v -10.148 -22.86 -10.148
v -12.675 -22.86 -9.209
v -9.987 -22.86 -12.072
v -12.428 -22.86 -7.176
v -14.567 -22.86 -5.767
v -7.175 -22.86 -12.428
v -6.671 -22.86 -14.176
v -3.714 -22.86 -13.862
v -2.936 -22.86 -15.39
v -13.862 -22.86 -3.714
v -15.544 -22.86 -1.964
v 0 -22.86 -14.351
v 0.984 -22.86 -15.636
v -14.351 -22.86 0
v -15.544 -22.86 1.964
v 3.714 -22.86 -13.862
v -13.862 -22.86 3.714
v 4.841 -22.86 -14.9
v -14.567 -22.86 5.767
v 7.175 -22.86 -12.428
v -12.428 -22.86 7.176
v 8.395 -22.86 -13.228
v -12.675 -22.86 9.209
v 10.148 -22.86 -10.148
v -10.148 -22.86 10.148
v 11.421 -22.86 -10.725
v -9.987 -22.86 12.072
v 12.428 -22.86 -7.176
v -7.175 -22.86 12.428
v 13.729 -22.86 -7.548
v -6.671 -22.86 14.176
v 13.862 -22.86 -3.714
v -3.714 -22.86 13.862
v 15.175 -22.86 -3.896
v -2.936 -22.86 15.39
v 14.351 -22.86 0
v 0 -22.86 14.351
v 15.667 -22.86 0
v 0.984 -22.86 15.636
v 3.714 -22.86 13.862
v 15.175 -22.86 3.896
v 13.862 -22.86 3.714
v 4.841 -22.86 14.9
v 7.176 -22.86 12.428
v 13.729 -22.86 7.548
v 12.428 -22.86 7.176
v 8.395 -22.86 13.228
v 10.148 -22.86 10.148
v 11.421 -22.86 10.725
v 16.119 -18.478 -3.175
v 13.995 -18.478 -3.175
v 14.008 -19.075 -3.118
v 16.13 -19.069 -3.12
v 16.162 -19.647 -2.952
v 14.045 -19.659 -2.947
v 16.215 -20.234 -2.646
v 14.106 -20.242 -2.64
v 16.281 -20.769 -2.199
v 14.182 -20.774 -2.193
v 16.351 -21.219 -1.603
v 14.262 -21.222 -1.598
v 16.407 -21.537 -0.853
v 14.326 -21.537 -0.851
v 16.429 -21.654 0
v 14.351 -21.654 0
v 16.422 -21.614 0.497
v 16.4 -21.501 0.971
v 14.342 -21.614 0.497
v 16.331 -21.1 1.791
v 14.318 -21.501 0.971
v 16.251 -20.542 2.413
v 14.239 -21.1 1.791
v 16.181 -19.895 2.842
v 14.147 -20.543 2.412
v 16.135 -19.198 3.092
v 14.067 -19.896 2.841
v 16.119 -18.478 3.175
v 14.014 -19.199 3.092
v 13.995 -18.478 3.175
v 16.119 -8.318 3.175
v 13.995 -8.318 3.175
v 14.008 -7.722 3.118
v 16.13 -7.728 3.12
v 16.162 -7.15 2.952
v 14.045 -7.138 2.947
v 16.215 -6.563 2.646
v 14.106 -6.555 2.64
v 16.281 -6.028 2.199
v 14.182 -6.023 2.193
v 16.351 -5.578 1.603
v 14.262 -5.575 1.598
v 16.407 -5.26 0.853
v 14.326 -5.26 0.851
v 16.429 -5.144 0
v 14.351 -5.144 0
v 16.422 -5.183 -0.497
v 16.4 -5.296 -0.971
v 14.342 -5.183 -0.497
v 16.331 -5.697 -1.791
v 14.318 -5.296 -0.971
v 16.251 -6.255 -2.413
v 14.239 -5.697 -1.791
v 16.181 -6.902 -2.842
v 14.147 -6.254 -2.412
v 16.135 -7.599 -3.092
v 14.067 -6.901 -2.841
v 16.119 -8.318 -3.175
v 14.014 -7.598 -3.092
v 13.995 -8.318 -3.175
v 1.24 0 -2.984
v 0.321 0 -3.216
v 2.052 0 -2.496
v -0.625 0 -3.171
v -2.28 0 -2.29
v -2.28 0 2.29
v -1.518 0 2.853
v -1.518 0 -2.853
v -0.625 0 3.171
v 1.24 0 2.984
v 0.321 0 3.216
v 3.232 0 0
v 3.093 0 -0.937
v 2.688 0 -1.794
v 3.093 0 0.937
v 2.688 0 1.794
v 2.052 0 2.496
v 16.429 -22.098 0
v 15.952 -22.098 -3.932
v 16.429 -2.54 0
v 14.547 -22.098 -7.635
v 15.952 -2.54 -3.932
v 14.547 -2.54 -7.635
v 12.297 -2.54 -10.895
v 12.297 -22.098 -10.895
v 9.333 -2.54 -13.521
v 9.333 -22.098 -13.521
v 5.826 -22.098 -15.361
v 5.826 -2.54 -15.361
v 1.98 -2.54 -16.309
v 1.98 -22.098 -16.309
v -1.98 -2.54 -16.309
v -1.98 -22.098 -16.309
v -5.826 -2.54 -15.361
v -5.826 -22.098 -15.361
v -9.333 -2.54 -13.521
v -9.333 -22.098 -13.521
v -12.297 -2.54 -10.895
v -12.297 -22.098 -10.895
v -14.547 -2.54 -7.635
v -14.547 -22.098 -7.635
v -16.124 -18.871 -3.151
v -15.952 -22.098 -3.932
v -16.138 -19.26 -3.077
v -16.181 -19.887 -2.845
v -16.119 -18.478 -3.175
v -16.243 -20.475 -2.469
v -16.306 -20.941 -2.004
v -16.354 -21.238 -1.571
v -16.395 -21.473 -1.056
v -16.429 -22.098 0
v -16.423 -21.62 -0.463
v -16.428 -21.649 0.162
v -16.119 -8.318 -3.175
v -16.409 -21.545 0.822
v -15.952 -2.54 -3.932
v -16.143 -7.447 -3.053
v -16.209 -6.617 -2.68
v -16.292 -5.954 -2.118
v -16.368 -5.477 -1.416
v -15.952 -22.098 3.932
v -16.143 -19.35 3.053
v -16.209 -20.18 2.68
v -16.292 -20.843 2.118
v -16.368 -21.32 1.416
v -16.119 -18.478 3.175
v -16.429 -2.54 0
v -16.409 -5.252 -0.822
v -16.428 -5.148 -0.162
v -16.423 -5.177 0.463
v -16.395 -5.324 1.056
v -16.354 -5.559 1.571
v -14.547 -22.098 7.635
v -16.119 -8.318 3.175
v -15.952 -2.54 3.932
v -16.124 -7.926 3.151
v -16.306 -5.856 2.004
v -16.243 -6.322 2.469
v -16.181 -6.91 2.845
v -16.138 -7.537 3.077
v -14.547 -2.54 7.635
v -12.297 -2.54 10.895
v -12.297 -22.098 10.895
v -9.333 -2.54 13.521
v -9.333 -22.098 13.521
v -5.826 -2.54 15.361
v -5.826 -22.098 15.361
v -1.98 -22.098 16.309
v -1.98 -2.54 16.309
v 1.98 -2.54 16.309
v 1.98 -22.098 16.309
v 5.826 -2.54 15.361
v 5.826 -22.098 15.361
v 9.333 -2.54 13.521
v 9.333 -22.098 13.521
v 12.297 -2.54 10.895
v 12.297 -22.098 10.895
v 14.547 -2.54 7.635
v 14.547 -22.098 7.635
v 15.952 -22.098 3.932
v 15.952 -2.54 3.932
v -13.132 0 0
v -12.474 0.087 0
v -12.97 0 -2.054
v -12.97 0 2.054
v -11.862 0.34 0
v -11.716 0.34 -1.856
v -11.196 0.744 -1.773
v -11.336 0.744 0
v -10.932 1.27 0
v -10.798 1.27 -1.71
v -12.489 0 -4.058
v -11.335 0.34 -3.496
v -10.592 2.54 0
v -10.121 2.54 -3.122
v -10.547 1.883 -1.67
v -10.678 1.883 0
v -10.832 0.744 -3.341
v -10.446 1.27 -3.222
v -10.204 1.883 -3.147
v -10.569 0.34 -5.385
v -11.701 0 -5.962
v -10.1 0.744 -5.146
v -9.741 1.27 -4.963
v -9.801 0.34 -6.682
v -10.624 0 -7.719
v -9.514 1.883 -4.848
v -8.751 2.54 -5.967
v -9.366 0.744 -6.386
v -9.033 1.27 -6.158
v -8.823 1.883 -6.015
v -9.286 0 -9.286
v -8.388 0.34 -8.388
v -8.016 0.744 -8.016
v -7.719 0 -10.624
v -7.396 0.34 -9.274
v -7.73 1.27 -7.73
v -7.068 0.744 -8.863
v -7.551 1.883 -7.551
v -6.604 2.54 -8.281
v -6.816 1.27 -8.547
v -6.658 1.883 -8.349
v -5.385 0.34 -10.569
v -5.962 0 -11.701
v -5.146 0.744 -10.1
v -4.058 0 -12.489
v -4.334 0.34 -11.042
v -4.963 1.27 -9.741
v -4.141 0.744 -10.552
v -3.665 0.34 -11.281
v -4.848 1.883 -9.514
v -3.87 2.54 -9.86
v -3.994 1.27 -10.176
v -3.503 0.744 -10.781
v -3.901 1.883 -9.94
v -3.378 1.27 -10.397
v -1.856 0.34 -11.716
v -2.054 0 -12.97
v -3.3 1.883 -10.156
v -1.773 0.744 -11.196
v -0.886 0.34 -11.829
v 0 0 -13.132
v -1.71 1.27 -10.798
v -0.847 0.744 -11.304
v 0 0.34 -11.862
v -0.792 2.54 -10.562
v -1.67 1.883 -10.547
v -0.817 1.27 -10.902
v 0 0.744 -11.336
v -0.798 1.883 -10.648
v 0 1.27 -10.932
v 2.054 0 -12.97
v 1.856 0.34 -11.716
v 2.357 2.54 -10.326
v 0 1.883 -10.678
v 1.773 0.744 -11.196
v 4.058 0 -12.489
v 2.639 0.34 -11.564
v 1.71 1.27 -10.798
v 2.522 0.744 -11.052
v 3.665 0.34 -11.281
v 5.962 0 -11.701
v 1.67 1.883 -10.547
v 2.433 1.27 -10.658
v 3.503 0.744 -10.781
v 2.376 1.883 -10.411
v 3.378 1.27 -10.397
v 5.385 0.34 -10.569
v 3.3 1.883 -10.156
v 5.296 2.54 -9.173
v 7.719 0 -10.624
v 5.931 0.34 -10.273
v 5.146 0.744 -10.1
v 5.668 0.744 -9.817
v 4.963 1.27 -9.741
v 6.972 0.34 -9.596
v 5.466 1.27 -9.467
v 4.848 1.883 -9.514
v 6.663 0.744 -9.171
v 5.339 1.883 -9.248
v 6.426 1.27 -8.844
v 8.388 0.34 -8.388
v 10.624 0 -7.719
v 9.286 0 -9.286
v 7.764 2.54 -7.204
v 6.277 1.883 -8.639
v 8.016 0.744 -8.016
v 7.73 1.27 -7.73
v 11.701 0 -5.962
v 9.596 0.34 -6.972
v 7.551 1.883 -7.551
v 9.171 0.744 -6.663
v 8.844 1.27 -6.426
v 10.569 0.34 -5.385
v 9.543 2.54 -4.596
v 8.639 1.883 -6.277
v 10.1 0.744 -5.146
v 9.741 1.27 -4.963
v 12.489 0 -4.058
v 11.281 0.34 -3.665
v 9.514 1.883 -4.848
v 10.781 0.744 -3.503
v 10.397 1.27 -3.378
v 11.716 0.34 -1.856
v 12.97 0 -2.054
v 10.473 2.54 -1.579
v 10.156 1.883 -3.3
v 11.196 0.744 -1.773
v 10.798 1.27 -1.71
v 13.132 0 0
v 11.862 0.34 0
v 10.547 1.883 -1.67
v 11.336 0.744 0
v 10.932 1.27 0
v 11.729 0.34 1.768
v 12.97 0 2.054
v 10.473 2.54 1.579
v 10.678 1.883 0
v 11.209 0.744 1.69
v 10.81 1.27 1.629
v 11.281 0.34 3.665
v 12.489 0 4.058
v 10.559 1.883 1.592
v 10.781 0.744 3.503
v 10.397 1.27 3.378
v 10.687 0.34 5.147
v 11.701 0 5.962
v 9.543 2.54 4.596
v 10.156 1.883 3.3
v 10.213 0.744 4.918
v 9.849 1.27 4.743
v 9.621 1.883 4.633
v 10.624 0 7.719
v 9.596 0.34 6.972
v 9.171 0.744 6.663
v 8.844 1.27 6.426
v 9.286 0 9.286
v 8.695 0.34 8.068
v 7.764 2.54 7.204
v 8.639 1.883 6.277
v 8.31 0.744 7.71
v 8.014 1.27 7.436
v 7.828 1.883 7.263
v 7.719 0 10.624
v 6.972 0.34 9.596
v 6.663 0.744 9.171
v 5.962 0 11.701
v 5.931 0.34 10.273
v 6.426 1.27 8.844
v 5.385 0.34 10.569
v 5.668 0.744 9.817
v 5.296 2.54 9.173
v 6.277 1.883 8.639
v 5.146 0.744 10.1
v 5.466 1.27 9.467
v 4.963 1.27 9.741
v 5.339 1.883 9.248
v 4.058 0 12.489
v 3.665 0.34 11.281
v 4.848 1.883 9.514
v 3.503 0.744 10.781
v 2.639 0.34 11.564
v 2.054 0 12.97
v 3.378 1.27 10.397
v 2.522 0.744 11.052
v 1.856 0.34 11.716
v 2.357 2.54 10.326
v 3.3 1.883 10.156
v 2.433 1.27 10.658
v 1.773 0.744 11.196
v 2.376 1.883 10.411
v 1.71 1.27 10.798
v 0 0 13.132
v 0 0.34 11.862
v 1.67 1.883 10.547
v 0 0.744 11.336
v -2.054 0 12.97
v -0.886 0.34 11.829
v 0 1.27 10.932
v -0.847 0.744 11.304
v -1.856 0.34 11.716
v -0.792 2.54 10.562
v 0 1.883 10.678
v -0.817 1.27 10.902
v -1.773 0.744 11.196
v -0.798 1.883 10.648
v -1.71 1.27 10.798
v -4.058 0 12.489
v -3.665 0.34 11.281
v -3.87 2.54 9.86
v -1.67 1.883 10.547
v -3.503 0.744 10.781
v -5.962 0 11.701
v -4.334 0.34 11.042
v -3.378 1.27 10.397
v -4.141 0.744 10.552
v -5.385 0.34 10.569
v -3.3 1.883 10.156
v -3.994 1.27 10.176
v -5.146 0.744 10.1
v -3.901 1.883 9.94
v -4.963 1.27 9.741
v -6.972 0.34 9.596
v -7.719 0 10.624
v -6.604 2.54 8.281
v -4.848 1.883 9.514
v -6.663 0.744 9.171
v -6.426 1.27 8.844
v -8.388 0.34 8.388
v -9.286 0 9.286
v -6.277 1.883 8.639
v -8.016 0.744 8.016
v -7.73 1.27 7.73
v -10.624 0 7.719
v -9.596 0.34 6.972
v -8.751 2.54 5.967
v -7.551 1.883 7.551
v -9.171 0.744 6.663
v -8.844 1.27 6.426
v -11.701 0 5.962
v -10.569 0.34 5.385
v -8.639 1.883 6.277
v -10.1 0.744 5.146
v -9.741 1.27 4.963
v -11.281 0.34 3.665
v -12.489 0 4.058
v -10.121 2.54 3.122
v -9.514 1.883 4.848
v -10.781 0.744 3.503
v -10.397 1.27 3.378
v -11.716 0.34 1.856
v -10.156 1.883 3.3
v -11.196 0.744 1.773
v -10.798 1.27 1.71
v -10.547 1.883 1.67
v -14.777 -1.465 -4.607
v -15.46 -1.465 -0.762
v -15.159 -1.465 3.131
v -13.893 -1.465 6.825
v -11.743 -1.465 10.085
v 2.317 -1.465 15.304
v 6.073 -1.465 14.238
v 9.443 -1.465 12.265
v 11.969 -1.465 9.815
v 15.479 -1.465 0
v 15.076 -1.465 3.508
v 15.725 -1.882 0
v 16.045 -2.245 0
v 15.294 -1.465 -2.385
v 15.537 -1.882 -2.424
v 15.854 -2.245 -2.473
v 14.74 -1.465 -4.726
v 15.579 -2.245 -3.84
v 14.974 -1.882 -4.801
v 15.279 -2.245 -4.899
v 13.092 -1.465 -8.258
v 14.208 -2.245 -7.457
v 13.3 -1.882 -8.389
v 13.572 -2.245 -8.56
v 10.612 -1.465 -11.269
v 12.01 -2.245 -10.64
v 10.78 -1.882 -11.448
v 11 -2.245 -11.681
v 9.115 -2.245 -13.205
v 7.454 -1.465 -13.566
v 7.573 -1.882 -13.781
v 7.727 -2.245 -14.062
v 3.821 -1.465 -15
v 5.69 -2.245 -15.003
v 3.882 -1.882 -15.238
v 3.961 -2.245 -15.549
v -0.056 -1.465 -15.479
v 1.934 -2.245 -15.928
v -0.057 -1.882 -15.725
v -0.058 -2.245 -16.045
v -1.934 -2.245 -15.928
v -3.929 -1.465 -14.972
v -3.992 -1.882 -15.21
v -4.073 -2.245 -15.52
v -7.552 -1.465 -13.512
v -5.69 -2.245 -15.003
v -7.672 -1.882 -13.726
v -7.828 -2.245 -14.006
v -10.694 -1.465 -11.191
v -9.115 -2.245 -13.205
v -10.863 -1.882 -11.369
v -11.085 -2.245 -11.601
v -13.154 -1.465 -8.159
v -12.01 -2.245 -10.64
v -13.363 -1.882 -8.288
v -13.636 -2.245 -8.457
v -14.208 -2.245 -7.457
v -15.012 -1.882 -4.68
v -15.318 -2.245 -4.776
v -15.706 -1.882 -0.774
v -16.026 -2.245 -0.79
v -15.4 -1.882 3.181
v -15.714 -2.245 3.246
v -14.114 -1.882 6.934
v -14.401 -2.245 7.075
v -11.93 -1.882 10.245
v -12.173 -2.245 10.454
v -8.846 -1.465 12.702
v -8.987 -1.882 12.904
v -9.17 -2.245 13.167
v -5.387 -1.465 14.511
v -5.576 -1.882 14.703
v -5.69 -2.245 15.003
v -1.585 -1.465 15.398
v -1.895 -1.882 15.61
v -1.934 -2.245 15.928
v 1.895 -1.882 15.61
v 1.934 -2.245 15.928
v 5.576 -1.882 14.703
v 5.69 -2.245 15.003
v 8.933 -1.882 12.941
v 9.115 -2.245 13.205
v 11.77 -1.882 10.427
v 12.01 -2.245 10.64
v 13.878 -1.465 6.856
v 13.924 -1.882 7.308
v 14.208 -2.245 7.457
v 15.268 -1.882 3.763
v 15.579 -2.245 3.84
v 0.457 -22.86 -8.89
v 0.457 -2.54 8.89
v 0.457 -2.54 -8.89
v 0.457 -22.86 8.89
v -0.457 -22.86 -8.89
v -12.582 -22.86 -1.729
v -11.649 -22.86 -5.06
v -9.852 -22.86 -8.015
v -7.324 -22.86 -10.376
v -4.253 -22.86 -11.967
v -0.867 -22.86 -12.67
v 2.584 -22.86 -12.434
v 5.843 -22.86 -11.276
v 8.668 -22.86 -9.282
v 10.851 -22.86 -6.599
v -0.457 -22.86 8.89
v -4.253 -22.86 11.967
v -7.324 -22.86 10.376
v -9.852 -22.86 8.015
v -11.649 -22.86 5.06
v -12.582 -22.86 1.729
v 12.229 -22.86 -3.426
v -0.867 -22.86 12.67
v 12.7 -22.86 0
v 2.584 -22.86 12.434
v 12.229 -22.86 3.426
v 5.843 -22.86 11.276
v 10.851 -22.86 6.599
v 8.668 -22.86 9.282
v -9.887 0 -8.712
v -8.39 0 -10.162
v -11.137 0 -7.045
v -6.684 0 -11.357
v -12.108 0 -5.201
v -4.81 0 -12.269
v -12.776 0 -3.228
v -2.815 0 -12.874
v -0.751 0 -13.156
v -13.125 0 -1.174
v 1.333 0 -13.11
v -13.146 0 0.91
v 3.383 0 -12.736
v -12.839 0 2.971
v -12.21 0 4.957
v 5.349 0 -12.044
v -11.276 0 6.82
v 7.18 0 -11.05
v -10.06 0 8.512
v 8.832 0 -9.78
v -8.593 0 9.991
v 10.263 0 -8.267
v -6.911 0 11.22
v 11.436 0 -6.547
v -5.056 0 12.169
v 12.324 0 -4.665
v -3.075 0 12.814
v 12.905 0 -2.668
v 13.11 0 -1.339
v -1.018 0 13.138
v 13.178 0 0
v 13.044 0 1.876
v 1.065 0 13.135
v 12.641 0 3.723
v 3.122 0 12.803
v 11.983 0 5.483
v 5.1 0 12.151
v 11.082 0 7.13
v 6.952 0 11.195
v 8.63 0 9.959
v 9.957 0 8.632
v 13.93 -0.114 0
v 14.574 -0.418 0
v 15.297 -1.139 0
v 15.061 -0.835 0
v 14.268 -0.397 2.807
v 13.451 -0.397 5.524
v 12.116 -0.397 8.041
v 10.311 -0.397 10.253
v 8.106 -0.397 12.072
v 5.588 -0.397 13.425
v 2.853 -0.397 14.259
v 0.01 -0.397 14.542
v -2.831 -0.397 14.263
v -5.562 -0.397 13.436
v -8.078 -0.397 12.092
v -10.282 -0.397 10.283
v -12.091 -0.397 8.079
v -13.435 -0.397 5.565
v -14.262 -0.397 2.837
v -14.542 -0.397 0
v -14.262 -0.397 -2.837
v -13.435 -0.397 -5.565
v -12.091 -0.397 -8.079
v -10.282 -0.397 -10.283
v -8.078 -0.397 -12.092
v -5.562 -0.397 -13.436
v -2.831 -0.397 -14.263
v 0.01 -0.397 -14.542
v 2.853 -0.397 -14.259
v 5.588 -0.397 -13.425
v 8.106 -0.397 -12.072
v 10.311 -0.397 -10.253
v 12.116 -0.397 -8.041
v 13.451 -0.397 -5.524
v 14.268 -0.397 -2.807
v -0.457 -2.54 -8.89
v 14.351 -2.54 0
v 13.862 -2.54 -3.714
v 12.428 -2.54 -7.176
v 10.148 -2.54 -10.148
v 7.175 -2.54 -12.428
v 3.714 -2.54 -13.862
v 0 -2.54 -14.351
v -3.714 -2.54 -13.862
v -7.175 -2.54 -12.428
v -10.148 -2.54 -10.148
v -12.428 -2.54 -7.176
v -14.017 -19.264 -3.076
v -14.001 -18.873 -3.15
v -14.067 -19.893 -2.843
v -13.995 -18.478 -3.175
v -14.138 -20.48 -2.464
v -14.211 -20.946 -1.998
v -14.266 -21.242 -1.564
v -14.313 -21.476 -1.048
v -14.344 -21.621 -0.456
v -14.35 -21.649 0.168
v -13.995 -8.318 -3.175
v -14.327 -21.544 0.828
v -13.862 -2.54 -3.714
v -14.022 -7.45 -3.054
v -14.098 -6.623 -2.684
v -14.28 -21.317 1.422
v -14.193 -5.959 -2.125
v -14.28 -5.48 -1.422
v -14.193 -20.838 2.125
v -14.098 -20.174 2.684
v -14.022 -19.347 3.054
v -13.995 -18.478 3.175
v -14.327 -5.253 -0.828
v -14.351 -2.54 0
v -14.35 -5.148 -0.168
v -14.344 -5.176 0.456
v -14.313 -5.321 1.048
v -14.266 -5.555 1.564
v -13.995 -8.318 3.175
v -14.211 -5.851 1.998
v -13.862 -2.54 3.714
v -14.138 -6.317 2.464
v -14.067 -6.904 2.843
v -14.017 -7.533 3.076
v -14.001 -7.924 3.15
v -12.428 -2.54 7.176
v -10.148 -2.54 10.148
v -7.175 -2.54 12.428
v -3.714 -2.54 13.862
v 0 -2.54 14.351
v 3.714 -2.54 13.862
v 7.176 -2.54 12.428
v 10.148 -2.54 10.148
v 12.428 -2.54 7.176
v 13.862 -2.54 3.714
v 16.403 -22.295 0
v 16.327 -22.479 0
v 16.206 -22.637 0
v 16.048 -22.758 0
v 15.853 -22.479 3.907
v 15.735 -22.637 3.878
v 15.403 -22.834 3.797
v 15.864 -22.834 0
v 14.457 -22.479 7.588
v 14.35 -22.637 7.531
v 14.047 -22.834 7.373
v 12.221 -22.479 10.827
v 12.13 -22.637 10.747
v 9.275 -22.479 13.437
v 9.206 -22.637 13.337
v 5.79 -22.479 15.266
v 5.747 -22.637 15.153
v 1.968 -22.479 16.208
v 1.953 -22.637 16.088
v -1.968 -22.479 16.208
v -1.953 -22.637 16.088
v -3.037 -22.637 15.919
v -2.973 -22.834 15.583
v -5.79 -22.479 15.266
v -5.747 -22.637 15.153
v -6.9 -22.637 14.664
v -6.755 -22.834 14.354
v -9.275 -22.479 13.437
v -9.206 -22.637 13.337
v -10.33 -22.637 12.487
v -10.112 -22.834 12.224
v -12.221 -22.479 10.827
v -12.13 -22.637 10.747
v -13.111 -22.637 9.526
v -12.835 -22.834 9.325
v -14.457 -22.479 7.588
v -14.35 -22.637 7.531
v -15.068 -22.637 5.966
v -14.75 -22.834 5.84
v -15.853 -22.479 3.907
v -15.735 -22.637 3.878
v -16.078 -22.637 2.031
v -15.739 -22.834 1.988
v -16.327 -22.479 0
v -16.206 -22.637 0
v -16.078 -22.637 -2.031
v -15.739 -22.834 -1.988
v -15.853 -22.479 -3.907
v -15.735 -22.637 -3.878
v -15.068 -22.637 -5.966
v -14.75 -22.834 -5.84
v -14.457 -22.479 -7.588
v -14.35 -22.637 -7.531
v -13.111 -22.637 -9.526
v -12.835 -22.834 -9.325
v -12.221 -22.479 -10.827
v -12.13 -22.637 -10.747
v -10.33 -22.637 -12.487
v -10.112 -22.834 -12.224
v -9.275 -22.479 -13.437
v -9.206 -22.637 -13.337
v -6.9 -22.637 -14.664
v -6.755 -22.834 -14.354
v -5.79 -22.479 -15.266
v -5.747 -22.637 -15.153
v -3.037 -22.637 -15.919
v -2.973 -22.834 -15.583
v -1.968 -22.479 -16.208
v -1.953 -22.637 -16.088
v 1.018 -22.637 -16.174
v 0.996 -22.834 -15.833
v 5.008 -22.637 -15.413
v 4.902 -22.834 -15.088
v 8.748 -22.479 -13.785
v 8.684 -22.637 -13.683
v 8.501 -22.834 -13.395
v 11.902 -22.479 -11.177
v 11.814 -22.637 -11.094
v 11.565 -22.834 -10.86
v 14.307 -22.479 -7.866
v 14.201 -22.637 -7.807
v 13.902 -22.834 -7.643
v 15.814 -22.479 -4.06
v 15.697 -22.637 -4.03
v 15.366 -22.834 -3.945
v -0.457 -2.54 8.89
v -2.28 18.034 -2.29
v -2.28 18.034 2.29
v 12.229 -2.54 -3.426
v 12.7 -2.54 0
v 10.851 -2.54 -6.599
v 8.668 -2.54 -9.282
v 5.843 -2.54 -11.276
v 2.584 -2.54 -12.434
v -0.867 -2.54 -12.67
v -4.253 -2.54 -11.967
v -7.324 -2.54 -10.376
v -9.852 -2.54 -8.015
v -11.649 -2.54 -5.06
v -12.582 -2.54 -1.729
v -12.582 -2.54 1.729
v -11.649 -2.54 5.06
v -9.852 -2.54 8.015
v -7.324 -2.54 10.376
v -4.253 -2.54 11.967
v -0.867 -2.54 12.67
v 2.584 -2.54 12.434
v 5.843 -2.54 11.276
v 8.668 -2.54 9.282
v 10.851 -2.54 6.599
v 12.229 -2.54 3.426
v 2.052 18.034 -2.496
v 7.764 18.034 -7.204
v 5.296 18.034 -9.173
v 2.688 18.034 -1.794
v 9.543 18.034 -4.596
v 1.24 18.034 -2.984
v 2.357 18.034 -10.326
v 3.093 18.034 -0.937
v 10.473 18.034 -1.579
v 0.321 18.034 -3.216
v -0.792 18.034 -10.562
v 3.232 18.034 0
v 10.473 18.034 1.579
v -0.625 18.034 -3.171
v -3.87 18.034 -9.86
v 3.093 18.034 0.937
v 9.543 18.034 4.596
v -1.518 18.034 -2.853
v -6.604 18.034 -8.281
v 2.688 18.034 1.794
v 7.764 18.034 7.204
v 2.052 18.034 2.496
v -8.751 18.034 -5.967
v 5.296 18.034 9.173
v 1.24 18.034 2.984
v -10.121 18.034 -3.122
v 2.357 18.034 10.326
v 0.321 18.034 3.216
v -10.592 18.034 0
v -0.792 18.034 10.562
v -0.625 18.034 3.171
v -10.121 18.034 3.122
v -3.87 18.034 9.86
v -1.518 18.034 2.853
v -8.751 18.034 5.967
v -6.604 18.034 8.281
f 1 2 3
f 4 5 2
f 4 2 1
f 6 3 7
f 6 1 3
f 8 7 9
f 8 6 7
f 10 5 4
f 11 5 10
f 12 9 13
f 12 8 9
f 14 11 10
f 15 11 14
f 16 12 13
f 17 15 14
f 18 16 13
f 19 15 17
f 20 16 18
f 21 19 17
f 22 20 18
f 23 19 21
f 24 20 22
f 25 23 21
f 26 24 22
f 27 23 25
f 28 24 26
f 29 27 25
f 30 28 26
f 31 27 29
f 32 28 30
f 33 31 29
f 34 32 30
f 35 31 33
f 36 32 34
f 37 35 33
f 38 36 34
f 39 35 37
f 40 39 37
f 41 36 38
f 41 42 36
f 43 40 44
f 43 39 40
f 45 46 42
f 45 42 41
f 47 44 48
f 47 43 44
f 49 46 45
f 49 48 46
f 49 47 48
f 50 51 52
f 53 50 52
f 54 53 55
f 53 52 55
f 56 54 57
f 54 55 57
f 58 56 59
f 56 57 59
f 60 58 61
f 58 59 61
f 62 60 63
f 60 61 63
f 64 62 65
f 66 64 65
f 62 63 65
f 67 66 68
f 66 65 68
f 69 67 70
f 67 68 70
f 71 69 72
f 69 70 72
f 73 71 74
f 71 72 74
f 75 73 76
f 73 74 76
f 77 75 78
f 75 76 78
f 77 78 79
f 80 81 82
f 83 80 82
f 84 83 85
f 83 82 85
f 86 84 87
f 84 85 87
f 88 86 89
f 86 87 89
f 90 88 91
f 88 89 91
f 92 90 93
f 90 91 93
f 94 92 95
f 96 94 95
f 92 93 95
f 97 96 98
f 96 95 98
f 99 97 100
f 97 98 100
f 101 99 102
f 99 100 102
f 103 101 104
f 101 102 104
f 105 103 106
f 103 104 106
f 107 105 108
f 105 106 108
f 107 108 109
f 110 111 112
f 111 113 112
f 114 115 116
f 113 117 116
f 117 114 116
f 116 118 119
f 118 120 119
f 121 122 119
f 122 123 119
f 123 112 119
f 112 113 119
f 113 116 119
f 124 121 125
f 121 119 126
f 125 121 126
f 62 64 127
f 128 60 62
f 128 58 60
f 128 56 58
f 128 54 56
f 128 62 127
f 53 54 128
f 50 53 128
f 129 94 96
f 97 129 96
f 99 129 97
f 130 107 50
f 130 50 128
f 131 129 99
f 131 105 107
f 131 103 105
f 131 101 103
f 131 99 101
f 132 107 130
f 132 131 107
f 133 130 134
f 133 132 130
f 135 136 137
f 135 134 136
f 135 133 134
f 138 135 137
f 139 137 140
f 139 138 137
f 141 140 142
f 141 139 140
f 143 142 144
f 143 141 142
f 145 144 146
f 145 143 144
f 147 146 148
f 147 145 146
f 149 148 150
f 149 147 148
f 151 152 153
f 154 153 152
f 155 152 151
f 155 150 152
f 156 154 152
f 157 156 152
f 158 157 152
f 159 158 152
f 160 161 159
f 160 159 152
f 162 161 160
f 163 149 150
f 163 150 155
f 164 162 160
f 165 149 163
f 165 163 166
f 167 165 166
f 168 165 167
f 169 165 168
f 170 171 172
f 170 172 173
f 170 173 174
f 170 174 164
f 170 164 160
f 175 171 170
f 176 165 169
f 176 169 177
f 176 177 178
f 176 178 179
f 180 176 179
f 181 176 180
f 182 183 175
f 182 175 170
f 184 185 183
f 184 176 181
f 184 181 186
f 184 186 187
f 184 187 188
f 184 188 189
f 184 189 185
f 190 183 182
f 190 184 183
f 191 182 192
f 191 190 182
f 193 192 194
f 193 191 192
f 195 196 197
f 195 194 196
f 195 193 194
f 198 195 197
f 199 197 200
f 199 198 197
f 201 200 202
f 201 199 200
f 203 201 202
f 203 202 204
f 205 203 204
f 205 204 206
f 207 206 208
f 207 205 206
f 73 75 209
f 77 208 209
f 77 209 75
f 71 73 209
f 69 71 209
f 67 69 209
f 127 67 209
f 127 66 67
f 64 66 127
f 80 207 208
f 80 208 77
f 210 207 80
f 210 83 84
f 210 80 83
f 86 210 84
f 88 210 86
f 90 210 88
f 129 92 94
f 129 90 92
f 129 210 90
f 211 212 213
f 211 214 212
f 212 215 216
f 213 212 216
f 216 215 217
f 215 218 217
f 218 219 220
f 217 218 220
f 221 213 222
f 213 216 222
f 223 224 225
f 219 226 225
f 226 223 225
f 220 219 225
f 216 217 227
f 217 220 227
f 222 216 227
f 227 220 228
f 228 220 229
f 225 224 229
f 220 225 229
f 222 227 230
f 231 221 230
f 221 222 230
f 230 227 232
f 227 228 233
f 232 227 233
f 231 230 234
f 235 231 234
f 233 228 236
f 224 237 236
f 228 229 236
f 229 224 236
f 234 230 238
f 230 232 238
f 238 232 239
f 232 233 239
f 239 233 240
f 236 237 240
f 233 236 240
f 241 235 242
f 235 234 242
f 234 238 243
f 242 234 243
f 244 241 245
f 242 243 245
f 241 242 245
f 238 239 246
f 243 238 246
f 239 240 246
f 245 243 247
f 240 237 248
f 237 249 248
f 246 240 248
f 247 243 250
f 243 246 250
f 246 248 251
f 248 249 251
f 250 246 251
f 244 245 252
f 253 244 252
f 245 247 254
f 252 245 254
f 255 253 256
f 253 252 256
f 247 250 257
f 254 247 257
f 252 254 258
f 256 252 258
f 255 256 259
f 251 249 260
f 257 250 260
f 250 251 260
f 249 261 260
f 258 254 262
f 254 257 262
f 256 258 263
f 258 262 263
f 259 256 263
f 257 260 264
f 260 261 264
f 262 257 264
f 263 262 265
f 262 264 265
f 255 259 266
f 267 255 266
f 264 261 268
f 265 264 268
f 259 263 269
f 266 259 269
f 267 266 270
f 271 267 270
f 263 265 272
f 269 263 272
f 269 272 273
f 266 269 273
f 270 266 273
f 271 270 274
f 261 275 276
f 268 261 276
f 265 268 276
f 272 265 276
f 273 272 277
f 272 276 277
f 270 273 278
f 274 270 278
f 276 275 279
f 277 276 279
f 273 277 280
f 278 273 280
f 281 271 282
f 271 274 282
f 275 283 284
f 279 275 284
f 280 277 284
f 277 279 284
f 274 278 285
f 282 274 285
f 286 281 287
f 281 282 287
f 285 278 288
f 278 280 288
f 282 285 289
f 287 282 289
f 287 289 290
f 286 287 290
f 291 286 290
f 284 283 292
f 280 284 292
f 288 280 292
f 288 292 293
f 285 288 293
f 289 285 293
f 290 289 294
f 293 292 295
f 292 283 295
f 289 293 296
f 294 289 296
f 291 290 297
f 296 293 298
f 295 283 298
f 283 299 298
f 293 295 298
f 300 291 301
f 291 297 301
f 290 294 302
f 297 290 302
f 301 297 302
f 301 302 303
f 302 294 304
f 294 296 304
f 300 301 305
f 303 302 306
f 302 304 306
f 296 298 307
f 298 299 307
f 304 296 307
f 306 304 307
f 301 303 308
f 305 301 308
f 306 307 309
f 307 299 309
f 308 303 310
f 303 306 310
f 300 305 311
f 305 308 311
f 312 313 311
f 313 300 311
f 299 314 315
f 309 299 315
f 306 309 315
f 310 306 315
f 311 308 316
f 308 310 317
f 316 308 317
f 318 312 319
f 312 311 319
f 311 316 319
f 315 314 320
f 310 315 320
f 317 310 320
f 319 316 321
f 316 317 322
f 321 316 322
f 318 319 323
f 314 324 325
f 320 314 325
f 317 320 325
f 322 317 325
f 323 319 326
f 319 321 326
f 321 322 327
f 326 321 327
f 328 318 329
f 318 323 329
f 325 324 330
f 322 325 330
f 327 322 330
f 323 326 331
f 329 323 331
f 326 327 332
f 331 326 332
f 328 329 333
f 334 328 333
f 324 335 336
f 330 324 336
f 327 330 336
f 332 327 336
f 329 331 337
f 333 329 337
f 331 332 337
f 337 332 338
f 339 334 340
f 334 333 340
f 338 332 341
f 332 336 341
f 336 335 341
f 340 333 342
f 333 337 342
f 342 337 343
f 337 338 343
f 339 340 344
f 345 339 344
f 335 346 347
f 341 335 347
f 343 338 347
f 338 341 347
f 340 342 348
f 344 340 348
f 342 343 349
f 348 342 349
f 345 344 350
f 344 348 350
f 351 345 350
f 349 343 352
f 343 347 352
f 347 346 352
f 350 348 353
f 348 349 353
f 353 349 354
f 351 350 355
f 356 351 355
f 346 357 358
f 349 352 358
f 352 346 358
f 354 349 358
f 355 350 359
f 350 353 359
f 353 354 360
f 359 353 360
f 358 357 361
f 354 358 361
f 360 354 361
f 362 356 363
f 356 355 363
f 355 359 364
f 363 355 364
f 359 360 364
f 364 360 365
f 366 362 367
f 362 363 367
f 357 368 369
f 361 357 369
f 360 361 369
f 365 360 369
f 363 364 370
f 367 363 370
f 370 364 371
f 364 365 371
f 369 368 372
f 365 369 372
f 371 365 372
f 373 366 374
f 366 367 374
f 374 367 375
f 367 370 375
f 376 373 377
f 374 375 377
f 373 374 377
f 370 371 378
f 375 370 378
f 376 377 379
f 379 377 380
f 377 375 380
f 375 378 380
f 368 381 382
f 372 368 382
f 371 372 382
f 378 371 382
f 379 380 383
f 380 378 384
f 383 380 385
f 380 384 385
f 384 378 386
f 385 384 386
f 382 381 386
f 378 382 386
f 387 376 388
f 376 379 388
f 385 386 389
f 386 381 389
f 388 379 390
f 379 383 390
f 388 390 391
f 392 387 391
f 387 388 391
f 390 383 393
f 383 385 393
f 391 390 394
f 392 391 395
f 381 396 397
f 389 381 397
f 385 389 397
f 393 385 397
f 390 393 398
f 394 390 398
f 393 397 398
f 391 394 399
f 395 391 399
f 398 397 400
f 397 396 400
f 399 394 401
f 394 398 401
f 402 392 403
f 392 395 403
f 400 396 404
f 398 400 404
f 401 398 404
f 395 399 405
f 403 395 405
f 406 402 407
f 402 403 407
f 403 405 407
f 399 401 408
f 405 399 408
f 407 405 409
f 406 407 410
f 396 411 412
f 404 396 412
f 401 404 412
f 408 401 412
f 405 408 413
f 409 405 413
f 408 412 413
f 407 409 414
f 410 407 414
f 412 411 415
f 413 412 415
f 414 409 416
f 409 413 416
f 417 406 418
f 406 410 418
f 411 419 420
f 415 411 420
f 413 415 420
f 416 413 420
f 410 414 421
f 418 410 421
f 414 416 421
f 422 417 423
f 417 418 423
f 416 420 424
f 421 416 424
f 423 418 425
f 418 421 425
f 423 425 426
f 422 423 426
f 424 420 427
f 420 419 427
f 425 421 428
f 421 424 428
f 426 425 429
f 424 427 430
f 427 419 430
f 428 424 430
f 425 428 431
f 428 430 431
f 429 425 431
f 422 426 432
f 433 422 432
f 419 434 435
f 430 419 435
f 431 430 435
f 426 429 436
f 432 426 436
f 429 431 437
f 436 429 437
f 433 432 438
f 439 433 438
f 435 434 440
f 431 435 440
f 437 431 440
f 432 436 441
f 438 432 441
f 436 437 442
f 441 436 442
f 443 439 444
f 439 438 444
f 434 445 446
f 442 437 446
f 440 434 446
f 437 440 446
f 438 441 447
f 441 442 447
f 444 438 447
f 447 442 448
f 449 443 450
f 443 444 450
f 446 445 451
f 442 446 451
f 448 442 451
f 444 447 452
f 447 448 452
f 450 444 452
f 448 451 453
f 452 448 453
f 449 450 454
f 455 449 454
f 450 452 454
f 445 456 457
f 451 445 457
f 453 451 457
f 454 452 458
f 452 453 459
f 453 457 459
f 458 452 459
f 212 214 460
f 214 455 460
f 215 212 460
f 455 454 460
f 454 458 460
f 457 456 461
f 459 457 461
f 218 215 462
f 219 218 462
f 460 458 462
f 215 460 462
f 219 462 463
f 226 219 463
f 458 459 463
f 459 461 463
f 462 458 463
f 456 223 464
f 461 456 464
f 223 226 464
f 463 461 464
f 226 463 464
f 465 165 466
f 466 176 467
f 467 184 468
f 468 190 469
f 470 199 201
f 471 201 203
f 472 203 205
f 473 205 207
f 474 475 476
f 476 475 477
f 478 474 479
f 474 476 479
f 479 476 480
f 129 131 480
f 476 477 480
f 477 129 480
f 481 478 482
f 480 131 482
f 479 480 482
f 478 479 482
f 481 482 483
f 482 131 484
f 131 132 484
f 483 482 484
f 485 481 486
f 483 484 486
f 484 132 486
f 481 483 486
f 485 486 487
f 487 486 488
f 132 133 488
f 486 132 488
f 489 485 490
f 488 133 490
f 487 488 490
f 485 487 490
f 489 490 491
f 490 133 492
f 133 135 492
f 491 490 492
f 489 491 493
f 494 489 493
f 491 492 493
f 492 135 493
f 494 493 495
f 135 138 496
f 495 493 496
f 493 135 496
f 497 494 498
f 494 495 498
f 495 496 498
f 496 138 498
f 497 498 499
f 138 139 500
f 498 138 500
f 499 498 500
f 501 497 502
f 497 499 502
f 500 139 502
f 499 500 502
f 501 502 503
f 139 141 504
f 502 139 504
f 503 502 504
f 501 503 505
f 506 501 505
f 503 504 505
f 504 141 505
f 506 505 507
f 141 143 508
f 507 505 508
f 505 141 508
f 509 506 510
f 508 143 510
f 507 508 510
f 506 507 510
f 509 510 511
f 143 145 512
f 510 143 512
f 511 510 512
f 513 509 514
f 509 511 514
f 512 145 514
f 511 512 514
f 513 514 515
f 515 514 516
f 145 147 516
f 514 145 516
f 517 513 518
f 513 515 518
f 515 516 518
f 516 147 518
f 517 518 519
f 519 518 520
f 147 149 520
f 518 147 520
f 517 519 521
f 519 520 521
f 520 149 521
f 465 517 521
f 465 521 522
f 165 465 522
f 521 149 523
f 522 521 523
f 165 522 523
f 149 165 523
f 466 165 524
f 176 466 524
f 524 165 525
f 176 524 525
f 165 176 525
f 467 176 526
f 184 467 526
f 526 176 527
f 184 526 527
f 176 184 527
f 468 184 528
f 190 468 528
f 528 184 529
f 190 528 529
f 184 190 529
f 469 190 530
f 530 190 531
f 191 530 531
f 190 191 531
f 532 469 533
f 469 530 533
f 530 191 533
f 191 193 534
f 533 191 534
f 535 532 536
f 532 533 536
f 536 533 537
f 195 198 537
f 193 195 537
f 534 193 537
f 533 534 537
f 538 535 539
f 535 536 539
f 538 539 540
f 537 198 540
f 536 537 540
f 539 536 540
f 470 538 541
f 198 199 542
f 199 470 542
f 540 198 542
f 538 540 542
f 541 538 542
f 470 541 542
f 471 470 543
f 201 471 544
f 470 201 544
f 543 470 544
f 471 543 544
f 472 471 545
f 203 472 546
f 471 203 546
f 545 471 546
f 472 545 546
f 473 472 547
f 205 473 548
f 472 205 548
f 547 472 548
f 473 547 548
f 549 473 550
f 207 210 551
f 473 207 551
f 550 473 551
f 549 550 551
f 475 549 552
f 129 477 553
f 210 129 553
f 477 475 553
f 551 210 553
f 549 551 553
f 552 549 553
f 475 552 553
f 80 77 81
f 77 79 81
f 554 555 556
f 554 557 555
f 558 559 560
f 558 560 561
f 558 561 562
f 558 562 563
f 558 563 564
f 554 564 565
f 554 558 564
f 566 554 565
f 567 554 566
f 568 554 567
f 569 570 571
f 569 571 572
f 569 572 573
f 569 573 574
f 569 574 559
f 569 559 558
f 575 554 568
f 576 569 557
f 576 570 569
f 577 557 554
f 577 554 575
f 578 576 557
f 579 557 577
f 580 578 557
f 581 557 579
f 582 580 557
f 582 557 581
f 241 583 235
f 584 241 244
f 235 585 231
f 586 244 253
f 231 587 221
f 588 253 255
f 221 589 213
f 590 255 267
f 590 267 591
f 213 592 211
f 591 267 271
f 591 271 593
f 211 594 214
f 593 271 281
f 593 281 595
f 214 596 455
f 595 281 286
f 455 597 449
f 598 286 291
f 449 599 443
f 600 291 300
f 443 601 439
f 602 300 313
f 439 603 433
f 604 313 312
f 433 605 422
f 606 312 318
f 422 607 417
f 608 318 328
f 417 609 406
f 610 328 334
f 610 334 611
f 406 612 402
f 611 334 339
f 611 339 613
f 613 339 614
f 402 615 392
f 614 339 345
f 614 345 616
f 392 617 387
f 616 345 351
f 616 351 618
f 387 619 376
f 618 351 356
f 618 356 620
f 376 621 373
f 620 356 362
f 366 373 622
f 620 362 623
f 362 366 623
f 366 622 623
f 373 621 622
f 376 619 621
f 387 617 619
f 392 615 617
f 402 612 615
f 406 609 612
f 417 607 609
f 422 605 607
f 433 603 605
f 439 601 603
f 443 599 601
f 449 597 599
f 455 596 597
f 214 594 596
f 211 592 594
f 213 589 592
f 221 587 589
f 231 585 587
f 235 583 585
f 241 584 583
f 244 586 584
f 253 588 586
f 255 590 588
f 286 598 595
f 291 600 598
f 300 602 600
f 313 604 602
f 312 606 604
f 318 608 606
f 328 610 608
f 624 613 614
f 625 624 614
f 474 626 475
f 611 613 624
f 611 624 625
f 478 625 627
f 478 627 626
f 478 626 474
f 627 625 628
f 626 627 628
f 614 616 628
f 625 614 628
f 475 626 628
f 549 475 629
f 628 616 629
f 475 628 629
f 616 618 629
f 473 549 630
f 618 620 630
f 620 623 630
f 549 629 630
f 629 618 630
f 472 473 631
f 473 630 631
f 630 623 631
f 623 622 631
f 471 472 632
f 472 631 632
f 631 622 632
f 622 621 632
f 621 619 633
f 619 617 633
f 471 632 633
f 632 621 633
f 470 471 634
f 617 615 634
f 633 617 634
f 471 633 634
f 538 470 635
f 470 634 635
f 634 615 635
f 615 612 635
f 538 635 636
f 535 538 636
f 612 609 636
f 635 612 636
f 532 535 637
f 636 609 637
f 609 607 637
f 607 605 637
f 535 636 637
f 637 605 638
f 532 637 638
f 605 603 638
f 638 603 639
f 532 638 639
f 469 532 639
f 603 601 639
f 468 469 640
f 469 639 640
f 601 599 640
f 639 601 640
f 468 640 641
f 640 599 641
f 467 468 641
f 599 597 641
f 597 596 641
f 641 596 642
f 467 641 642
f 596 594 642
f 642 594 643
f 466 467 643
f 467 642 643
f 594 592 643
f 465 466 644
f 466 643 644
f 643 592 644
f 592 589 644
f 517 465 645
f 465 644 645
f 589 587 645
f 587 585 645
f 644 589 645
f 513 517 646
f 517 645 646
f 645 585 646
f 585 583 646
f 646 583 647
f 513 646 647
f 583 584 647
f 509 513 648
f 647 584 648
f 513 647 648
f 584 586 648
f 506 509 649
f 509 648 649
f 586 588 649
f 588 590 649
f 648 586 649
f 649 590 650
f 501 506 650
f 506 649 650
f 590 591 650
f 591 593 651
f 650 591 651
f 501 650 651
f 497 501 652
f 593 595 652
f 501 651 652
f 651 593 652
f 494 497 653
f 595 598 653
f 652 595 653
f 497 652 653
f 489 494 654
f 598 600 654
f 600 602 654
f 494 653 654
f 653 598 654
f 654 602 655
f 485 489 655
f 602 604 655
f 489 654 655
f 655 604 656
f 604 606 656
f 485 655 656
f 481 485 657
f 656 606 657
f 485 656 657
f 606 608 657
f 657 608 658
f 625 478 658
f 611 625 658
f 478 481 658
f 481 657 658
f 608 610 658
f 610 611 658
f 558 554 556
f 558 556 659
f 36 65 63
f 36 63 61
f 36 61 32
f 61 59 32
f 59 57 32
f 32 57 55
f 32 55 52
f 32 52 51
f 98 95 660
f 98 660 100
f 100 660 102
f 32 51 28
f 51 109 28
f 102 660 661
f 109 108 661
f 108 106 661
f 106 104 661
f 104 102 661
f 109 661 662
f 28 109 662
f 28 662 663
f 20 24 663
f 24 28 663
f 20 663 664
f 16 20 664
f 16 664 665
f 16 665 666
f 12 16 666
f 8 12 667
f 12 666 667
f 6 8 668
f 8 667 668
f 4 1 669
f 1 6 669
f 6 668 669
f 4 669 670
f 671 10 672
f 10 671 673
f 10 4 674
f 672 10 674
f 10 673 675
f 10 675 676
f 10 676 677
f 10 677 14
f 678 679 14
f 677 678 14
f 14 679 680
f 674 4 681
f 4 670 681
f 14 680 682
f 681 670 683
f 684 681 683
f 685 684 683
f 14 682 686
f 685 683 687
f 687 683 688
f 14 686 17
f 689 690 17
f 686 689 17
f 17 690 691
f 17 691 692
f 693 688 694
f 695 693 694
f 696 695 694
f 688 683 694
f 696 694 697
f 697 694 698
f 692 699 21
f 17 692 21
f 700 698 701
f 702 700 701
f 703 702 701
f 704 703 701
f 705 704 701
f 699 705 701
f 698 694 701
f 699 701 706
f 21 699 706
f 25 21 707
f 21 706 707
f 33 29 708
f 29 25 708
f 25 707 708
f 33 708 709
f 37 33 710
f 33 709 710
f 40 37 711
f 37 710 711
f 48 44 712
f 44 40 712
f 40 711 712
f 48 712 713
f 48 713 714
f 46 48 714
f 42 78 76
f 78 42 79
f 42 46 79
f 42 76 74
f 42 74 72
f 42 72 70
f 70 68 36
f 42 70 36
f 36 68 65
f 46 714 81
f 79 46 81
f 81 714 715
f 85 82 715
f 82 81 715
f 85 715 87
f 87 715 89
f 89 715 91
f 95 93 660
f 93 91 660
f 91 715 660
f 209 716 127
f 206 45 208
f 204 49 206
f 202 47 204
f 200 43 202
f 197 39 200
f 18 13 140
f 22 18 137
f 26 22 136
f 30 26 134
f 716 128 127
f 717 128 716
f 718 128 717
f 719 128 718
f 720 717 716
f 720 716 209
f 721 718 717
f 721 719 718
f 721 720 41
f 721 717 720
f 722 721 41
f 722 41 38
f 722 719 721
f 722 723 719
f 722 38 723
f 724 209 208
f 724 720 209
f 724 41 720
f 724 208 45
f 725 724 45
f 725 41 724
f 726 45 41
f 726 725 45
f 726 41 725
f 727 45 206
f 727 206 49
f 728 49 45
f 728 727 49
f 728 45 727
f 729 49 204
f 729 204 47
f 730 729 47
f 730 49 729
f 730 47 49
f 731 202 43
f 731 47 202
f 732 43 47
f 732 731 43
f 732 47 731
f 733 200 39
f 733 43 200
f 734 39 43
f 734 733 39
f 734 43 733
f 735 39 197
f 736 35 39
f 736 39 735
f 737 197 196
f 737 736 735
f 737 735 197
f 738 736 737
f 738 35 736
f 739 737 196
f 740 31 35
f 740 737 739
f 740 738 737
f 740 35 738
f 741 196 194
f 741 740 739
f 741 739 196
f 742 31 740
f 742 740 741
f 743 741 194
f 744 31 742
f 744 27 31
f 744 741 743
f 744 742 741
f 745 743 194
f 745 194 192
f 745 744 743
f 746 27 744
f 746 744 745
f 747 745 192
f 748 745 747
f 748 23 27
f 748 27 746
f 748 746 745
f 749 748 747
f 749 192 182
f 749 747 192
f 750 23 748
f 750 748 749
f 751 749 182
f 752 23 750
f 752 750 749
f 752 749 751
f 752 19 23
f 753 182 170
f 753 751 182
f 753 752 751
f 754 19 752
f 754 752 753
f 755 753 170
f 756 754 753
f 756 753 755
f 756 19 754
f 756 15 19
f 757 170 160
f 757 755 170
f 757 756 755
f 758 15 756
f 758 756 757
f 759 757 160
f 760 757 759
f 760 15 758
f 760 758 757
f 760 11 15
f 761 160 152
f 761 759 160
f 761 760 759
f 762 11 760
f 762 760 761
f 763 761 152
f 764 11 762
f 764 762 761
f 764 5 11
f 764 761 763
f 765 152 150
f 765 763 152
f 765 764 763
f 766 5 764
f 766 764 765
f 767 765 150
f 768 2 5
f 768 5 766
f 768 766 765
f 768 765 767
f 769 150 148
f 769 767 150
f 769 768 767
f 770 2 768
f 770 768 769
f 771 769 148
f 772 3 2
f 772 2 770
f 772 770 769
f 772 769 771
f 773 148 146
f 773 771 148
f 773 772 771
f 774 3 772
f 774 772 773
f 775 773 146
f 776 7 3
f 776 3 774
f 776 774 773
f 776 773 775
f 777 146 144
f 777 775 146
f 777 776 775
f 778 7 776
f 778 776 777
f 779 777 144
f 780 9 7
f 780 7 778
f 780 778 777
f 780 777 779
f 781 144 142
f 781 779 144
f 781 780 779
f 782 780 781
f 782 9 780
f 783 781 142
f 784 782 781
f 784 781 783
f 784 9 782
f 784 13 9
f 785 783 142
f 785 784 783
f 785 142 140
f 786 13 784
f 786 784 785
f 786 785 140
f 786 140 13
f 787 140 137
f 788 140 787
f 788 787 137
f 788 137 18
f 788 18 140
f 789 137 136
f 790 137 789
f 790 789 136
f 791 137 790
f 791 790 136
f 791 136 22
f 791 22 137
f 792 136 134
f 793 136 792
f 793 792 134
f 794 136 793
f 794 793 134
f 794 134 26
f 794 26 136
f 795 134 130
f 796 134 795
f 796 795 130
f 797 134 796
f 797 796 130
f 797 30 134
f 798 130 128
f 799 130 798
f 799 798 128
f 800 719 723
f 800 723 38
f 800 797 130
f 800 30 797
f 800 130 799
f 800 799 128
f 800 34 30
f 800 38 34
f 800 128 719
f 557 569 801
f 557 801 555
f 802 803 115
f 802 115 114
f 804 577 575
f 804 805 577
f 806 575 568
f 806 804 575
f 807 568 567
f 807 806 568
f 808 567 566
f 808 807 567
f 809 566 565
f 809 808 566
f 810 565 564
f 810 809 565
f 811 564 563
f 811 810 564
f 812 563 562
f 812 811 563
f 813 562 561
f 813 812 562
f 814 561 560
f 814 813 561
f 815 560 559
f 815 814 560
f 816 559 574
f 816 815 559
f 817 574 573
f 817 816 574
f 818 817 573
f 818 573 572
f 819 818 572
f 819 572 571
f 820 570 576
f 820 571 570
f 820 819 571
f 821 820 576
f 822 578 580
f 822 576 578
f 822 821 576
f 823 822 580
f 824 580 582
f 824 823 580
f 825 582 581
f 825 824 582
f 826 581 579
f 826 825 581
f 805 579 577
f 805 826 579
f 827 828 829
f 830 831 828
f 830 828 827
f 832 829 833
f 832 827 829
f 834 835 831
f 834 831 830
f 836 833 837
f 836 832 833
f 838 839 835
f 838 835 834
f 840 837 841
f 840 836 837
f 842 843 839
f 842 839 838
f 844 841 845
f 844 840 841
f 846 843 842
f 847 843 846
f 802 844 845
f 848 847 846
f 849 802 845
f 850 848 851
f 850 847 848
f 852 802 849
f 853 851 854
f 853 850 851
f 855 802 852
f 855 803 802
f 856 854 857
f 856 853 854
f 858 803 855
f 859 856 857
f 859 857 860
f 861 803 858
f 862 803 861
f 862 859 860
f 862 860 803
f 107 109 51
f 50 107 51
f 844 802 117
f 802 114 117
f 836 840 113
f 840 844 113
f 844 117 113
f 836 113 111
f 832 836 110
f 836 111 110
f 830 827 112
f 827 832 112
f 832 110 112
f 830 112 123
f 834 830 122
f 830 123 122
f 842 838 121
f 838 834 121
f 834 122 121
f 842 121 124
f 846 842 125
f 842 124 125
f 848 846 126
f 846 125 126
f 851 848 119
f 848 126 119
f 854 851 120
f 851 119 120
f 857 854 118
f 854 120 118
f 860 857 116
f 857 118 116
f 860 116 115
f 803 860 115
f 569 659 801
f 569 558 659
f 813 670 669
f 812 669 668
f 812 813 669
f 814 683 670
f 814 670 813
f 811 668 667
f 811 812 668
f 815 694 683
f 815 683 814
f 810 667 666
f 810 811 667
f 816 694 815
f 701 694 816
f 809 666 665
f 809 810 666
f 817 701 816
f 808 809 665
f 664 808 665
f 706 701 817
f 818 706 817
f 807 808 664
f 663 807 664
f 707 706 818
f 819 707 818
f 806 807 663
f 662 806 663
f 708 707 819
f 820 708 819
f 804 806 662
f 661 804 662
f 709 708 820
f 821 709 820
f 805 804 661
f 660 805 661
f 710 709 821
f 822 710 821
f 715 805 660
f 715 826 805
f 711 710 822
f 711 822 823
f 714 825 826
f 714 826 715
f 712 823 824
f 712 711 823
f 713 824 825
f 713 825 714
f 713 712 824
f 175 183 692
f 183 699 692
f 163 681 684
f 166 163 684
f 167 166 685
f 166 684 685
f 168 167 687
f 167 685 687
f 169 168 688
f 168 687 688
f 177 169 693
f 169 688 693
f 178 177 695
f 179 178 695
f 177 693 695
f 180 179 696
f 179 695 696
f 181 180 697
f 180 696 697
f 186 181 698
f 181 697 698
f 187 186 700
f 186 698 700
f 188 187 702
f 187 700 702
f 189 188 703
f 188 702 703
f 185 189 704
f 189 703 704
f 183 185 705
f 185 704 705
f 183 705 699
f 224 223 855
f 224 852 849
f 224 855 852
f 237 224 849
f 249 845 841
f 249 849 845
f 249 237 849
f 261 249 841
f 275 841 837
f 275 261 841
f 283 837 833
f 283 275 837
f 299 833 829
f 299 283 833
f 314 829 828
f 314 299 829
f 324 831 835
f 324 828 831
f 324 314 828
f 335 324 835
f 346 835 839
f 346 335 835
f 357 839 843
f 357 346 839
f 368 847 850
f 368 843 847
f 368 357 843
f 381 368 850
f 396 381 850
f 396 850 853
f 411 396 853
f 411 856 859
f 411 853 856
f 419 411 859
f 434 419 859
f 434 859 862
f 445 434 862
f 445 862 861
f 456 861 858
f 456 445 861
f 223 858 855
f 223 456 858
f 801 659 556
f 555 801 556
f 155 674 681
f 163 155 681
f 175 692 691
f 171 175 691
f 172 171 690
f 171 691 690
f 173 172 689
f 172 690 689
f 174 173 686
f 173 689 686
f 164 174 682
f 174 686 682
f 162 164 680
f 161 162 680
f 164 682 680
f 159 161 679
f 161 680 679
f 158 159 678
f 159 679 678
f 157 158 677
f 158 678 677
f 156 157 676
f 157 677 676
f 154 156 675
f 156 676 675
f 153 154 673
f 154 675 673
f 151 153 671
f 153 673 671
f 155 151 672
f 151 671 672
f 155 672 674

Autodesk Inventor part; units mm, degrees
ref_plane "XZ Plane" through (0, 0, 0) normal (0, 1, 0) x (-1, 0, 0)
ref_plane "XY Plane" through (0, 0, 0) normal (0, 0, 1) x (1, 0, 0)
sketch "Sketch1" plane through (0, 0, 0) normal (0, 1, 0) x (-1, 0, 0)
  circle A0 centre (0, 0) radius 3.2318
  line L0 (2.28, 2.2905) -> (2.28, -2.2905)
  circle A1 centre (0, 0) radius 10.5918
  dimension "d2" = 5.5118
  dimension "d3" = 21.1836
extrude "Extrusion1" add sketch "Sketch1" along normal blind 18.034 contours A0 L0 | A1 picked at (2.4147, -0.6)
sketch "Sketch2" plane through (0, 0, 0) normal (0, -1, 0) x (1, 0, 0)
  circle A0 centre (0, 0) radius 15.24
  dimension "d6" = 30.48
extrude "Extrusion2" add sketch "Sketch2" along normal blind 2.54
sketch "Sketch3" plane through (0, -2.54, 0) normal (0, -1, 0) x (1, 0, 0)
  circle A0 centre (0, 0) radius 14.351
  circle A1 centre (0, 0) radius 16.4291
  dimension "d9" = 28.702
extrude "Extrusion3" add sketch "Sketch3" along normal blind 20.32
fillet "Fillet3" radius 2.54 1 edges at (10.5918, 0, 0)
fillet "Fillet4" radius 2.54 1 edges at (-15.24, -2.54, 0)
fillet "Fillet5" radius 2.54 1 edges at (-15.24, 0, 0)
ref_plane "Work Plane1" through (12.7, 0, 0) normal (1, 0, 0) x (0, 1, 0)
sketch "Sketch6" plane through (12.7, 0, 0) normal (1, 0, 0) x (0, 1, 0)
  arc A0 (-8.3185, -1.27) -> (-8.3185, 1.27) centre (-8.3185, 0) ccw construction
  arc A1 (-18.4785, 1.27) -> (-18.4785, -1.27) centre (-18.4785, 0) ccw construction
  line L0 (-18.4785, 1.27) -> (-8.3185, 1.27) construction
  line L1 (-8.3185, -1.27) -> (-18.4785, -1.27) construction
  arc A2 (-8.3185, -3.175) -> (-8.3185, 3.175) centre (-8.3185, 0) ccw
  line L2 (-8.3185, -3.175) -> (-18.4785, -3.175)
  arc A3 (-18.4785, 3.175) -> (-18.4785, -3.175) centre (-18.4785, 0) ccw
  line L3 (-18.4785, 3.175) -> (-8.3185, 3.175)
  point P0 (0, 0)
  dimension "d34" = 3.175
extrude "Extrusion6" cut sketch "Sketch6" along normal blind 25.4
mirror "Mirror1" about plane through (0, 0, 0) normal (1, 0, 0) of "Extrusion6"
fillet "Fillet10" radius 0.762 1 edges at (-16.4291, -22.86, 0)
sketch "Sketch7" plane through (0, -2.54, 0) normal (0, -1, 0) x (1, 0, 0)
  circle A0 centre (0, 0) radius 12.7
  dimension "d40" = 25.4
extrude "Extrusion7" add sketch "Sketch7" along normal blind 20.32
sketch "Sketch8" plane through (0, -22.86, 0) normal (0, -1, 0) x (1, 0, 0)
  line L0 (-0.4572, 8.89) -> (0.4572, 8.89)
  line L1 (0.4572, 8.89) -> (0.4572, -8.89)
  line L2 (0.4572, -8.89) -> (-0.4572, -8.89)
  line L3 (-0.4572, -8.89) -> (-0.4572, 8.89)
  line L4 (-0.4572, 8.89) -> (0.4572, -8.89) construction
  line L5 (0.4572, 8.89) -> (-0.4572, -8.89) construction
  point P0 (0, 0)
  dimension "d43" = 0.9144
  dimension "d44" = 17.78
extrude "Extrusion8" cut sketch "Sketch8" against normal blind 20.32
properties part number "Autofeeder part 1"
